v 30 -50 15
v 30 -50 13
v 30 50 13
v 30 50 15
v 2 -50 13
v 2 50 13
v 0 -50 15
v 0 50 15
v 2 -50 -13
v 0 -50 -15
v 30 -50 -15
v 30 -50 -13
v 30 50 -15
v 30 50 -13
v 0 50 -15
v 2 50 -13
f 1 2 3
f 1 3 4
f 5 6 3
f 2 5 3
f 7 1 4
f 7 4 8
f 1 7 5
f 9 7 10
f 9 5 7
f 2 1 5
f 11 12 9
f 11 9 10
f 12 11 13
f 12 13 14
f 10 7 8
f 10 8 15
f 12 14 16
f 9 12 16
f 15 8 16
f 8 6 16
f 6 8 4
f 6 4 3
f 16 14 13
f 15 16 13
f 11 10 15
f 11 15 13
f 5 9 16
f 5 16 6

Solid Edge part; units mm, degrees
sketch "Sketch1" plane through (0, 0, 0) normal (0, -1, 0) x (1, 0, 0)
  line L0 (0, 15) -> (0, -15)
  line L1 (0, -15) -> (30, -15)
  line L2 (30, -15) -> (30, -13)
  line L3 (30, -13) -> (2, -13)
  line L4 (2, -13) -> (2, 13)
  line L5 (2, 13) -> (30, 13)
  line L6 (30, 13) -> (30, 15)
  line L7 (30, 15) -> (0, 15)
  dimension "D1" = 2
  dimension "D2" = 30
  dimension "D3" = 28
extrude "Protrusion1" add sketch "Sketch1" along normal mid plane 100
properties material "Aluminum, 1060"
